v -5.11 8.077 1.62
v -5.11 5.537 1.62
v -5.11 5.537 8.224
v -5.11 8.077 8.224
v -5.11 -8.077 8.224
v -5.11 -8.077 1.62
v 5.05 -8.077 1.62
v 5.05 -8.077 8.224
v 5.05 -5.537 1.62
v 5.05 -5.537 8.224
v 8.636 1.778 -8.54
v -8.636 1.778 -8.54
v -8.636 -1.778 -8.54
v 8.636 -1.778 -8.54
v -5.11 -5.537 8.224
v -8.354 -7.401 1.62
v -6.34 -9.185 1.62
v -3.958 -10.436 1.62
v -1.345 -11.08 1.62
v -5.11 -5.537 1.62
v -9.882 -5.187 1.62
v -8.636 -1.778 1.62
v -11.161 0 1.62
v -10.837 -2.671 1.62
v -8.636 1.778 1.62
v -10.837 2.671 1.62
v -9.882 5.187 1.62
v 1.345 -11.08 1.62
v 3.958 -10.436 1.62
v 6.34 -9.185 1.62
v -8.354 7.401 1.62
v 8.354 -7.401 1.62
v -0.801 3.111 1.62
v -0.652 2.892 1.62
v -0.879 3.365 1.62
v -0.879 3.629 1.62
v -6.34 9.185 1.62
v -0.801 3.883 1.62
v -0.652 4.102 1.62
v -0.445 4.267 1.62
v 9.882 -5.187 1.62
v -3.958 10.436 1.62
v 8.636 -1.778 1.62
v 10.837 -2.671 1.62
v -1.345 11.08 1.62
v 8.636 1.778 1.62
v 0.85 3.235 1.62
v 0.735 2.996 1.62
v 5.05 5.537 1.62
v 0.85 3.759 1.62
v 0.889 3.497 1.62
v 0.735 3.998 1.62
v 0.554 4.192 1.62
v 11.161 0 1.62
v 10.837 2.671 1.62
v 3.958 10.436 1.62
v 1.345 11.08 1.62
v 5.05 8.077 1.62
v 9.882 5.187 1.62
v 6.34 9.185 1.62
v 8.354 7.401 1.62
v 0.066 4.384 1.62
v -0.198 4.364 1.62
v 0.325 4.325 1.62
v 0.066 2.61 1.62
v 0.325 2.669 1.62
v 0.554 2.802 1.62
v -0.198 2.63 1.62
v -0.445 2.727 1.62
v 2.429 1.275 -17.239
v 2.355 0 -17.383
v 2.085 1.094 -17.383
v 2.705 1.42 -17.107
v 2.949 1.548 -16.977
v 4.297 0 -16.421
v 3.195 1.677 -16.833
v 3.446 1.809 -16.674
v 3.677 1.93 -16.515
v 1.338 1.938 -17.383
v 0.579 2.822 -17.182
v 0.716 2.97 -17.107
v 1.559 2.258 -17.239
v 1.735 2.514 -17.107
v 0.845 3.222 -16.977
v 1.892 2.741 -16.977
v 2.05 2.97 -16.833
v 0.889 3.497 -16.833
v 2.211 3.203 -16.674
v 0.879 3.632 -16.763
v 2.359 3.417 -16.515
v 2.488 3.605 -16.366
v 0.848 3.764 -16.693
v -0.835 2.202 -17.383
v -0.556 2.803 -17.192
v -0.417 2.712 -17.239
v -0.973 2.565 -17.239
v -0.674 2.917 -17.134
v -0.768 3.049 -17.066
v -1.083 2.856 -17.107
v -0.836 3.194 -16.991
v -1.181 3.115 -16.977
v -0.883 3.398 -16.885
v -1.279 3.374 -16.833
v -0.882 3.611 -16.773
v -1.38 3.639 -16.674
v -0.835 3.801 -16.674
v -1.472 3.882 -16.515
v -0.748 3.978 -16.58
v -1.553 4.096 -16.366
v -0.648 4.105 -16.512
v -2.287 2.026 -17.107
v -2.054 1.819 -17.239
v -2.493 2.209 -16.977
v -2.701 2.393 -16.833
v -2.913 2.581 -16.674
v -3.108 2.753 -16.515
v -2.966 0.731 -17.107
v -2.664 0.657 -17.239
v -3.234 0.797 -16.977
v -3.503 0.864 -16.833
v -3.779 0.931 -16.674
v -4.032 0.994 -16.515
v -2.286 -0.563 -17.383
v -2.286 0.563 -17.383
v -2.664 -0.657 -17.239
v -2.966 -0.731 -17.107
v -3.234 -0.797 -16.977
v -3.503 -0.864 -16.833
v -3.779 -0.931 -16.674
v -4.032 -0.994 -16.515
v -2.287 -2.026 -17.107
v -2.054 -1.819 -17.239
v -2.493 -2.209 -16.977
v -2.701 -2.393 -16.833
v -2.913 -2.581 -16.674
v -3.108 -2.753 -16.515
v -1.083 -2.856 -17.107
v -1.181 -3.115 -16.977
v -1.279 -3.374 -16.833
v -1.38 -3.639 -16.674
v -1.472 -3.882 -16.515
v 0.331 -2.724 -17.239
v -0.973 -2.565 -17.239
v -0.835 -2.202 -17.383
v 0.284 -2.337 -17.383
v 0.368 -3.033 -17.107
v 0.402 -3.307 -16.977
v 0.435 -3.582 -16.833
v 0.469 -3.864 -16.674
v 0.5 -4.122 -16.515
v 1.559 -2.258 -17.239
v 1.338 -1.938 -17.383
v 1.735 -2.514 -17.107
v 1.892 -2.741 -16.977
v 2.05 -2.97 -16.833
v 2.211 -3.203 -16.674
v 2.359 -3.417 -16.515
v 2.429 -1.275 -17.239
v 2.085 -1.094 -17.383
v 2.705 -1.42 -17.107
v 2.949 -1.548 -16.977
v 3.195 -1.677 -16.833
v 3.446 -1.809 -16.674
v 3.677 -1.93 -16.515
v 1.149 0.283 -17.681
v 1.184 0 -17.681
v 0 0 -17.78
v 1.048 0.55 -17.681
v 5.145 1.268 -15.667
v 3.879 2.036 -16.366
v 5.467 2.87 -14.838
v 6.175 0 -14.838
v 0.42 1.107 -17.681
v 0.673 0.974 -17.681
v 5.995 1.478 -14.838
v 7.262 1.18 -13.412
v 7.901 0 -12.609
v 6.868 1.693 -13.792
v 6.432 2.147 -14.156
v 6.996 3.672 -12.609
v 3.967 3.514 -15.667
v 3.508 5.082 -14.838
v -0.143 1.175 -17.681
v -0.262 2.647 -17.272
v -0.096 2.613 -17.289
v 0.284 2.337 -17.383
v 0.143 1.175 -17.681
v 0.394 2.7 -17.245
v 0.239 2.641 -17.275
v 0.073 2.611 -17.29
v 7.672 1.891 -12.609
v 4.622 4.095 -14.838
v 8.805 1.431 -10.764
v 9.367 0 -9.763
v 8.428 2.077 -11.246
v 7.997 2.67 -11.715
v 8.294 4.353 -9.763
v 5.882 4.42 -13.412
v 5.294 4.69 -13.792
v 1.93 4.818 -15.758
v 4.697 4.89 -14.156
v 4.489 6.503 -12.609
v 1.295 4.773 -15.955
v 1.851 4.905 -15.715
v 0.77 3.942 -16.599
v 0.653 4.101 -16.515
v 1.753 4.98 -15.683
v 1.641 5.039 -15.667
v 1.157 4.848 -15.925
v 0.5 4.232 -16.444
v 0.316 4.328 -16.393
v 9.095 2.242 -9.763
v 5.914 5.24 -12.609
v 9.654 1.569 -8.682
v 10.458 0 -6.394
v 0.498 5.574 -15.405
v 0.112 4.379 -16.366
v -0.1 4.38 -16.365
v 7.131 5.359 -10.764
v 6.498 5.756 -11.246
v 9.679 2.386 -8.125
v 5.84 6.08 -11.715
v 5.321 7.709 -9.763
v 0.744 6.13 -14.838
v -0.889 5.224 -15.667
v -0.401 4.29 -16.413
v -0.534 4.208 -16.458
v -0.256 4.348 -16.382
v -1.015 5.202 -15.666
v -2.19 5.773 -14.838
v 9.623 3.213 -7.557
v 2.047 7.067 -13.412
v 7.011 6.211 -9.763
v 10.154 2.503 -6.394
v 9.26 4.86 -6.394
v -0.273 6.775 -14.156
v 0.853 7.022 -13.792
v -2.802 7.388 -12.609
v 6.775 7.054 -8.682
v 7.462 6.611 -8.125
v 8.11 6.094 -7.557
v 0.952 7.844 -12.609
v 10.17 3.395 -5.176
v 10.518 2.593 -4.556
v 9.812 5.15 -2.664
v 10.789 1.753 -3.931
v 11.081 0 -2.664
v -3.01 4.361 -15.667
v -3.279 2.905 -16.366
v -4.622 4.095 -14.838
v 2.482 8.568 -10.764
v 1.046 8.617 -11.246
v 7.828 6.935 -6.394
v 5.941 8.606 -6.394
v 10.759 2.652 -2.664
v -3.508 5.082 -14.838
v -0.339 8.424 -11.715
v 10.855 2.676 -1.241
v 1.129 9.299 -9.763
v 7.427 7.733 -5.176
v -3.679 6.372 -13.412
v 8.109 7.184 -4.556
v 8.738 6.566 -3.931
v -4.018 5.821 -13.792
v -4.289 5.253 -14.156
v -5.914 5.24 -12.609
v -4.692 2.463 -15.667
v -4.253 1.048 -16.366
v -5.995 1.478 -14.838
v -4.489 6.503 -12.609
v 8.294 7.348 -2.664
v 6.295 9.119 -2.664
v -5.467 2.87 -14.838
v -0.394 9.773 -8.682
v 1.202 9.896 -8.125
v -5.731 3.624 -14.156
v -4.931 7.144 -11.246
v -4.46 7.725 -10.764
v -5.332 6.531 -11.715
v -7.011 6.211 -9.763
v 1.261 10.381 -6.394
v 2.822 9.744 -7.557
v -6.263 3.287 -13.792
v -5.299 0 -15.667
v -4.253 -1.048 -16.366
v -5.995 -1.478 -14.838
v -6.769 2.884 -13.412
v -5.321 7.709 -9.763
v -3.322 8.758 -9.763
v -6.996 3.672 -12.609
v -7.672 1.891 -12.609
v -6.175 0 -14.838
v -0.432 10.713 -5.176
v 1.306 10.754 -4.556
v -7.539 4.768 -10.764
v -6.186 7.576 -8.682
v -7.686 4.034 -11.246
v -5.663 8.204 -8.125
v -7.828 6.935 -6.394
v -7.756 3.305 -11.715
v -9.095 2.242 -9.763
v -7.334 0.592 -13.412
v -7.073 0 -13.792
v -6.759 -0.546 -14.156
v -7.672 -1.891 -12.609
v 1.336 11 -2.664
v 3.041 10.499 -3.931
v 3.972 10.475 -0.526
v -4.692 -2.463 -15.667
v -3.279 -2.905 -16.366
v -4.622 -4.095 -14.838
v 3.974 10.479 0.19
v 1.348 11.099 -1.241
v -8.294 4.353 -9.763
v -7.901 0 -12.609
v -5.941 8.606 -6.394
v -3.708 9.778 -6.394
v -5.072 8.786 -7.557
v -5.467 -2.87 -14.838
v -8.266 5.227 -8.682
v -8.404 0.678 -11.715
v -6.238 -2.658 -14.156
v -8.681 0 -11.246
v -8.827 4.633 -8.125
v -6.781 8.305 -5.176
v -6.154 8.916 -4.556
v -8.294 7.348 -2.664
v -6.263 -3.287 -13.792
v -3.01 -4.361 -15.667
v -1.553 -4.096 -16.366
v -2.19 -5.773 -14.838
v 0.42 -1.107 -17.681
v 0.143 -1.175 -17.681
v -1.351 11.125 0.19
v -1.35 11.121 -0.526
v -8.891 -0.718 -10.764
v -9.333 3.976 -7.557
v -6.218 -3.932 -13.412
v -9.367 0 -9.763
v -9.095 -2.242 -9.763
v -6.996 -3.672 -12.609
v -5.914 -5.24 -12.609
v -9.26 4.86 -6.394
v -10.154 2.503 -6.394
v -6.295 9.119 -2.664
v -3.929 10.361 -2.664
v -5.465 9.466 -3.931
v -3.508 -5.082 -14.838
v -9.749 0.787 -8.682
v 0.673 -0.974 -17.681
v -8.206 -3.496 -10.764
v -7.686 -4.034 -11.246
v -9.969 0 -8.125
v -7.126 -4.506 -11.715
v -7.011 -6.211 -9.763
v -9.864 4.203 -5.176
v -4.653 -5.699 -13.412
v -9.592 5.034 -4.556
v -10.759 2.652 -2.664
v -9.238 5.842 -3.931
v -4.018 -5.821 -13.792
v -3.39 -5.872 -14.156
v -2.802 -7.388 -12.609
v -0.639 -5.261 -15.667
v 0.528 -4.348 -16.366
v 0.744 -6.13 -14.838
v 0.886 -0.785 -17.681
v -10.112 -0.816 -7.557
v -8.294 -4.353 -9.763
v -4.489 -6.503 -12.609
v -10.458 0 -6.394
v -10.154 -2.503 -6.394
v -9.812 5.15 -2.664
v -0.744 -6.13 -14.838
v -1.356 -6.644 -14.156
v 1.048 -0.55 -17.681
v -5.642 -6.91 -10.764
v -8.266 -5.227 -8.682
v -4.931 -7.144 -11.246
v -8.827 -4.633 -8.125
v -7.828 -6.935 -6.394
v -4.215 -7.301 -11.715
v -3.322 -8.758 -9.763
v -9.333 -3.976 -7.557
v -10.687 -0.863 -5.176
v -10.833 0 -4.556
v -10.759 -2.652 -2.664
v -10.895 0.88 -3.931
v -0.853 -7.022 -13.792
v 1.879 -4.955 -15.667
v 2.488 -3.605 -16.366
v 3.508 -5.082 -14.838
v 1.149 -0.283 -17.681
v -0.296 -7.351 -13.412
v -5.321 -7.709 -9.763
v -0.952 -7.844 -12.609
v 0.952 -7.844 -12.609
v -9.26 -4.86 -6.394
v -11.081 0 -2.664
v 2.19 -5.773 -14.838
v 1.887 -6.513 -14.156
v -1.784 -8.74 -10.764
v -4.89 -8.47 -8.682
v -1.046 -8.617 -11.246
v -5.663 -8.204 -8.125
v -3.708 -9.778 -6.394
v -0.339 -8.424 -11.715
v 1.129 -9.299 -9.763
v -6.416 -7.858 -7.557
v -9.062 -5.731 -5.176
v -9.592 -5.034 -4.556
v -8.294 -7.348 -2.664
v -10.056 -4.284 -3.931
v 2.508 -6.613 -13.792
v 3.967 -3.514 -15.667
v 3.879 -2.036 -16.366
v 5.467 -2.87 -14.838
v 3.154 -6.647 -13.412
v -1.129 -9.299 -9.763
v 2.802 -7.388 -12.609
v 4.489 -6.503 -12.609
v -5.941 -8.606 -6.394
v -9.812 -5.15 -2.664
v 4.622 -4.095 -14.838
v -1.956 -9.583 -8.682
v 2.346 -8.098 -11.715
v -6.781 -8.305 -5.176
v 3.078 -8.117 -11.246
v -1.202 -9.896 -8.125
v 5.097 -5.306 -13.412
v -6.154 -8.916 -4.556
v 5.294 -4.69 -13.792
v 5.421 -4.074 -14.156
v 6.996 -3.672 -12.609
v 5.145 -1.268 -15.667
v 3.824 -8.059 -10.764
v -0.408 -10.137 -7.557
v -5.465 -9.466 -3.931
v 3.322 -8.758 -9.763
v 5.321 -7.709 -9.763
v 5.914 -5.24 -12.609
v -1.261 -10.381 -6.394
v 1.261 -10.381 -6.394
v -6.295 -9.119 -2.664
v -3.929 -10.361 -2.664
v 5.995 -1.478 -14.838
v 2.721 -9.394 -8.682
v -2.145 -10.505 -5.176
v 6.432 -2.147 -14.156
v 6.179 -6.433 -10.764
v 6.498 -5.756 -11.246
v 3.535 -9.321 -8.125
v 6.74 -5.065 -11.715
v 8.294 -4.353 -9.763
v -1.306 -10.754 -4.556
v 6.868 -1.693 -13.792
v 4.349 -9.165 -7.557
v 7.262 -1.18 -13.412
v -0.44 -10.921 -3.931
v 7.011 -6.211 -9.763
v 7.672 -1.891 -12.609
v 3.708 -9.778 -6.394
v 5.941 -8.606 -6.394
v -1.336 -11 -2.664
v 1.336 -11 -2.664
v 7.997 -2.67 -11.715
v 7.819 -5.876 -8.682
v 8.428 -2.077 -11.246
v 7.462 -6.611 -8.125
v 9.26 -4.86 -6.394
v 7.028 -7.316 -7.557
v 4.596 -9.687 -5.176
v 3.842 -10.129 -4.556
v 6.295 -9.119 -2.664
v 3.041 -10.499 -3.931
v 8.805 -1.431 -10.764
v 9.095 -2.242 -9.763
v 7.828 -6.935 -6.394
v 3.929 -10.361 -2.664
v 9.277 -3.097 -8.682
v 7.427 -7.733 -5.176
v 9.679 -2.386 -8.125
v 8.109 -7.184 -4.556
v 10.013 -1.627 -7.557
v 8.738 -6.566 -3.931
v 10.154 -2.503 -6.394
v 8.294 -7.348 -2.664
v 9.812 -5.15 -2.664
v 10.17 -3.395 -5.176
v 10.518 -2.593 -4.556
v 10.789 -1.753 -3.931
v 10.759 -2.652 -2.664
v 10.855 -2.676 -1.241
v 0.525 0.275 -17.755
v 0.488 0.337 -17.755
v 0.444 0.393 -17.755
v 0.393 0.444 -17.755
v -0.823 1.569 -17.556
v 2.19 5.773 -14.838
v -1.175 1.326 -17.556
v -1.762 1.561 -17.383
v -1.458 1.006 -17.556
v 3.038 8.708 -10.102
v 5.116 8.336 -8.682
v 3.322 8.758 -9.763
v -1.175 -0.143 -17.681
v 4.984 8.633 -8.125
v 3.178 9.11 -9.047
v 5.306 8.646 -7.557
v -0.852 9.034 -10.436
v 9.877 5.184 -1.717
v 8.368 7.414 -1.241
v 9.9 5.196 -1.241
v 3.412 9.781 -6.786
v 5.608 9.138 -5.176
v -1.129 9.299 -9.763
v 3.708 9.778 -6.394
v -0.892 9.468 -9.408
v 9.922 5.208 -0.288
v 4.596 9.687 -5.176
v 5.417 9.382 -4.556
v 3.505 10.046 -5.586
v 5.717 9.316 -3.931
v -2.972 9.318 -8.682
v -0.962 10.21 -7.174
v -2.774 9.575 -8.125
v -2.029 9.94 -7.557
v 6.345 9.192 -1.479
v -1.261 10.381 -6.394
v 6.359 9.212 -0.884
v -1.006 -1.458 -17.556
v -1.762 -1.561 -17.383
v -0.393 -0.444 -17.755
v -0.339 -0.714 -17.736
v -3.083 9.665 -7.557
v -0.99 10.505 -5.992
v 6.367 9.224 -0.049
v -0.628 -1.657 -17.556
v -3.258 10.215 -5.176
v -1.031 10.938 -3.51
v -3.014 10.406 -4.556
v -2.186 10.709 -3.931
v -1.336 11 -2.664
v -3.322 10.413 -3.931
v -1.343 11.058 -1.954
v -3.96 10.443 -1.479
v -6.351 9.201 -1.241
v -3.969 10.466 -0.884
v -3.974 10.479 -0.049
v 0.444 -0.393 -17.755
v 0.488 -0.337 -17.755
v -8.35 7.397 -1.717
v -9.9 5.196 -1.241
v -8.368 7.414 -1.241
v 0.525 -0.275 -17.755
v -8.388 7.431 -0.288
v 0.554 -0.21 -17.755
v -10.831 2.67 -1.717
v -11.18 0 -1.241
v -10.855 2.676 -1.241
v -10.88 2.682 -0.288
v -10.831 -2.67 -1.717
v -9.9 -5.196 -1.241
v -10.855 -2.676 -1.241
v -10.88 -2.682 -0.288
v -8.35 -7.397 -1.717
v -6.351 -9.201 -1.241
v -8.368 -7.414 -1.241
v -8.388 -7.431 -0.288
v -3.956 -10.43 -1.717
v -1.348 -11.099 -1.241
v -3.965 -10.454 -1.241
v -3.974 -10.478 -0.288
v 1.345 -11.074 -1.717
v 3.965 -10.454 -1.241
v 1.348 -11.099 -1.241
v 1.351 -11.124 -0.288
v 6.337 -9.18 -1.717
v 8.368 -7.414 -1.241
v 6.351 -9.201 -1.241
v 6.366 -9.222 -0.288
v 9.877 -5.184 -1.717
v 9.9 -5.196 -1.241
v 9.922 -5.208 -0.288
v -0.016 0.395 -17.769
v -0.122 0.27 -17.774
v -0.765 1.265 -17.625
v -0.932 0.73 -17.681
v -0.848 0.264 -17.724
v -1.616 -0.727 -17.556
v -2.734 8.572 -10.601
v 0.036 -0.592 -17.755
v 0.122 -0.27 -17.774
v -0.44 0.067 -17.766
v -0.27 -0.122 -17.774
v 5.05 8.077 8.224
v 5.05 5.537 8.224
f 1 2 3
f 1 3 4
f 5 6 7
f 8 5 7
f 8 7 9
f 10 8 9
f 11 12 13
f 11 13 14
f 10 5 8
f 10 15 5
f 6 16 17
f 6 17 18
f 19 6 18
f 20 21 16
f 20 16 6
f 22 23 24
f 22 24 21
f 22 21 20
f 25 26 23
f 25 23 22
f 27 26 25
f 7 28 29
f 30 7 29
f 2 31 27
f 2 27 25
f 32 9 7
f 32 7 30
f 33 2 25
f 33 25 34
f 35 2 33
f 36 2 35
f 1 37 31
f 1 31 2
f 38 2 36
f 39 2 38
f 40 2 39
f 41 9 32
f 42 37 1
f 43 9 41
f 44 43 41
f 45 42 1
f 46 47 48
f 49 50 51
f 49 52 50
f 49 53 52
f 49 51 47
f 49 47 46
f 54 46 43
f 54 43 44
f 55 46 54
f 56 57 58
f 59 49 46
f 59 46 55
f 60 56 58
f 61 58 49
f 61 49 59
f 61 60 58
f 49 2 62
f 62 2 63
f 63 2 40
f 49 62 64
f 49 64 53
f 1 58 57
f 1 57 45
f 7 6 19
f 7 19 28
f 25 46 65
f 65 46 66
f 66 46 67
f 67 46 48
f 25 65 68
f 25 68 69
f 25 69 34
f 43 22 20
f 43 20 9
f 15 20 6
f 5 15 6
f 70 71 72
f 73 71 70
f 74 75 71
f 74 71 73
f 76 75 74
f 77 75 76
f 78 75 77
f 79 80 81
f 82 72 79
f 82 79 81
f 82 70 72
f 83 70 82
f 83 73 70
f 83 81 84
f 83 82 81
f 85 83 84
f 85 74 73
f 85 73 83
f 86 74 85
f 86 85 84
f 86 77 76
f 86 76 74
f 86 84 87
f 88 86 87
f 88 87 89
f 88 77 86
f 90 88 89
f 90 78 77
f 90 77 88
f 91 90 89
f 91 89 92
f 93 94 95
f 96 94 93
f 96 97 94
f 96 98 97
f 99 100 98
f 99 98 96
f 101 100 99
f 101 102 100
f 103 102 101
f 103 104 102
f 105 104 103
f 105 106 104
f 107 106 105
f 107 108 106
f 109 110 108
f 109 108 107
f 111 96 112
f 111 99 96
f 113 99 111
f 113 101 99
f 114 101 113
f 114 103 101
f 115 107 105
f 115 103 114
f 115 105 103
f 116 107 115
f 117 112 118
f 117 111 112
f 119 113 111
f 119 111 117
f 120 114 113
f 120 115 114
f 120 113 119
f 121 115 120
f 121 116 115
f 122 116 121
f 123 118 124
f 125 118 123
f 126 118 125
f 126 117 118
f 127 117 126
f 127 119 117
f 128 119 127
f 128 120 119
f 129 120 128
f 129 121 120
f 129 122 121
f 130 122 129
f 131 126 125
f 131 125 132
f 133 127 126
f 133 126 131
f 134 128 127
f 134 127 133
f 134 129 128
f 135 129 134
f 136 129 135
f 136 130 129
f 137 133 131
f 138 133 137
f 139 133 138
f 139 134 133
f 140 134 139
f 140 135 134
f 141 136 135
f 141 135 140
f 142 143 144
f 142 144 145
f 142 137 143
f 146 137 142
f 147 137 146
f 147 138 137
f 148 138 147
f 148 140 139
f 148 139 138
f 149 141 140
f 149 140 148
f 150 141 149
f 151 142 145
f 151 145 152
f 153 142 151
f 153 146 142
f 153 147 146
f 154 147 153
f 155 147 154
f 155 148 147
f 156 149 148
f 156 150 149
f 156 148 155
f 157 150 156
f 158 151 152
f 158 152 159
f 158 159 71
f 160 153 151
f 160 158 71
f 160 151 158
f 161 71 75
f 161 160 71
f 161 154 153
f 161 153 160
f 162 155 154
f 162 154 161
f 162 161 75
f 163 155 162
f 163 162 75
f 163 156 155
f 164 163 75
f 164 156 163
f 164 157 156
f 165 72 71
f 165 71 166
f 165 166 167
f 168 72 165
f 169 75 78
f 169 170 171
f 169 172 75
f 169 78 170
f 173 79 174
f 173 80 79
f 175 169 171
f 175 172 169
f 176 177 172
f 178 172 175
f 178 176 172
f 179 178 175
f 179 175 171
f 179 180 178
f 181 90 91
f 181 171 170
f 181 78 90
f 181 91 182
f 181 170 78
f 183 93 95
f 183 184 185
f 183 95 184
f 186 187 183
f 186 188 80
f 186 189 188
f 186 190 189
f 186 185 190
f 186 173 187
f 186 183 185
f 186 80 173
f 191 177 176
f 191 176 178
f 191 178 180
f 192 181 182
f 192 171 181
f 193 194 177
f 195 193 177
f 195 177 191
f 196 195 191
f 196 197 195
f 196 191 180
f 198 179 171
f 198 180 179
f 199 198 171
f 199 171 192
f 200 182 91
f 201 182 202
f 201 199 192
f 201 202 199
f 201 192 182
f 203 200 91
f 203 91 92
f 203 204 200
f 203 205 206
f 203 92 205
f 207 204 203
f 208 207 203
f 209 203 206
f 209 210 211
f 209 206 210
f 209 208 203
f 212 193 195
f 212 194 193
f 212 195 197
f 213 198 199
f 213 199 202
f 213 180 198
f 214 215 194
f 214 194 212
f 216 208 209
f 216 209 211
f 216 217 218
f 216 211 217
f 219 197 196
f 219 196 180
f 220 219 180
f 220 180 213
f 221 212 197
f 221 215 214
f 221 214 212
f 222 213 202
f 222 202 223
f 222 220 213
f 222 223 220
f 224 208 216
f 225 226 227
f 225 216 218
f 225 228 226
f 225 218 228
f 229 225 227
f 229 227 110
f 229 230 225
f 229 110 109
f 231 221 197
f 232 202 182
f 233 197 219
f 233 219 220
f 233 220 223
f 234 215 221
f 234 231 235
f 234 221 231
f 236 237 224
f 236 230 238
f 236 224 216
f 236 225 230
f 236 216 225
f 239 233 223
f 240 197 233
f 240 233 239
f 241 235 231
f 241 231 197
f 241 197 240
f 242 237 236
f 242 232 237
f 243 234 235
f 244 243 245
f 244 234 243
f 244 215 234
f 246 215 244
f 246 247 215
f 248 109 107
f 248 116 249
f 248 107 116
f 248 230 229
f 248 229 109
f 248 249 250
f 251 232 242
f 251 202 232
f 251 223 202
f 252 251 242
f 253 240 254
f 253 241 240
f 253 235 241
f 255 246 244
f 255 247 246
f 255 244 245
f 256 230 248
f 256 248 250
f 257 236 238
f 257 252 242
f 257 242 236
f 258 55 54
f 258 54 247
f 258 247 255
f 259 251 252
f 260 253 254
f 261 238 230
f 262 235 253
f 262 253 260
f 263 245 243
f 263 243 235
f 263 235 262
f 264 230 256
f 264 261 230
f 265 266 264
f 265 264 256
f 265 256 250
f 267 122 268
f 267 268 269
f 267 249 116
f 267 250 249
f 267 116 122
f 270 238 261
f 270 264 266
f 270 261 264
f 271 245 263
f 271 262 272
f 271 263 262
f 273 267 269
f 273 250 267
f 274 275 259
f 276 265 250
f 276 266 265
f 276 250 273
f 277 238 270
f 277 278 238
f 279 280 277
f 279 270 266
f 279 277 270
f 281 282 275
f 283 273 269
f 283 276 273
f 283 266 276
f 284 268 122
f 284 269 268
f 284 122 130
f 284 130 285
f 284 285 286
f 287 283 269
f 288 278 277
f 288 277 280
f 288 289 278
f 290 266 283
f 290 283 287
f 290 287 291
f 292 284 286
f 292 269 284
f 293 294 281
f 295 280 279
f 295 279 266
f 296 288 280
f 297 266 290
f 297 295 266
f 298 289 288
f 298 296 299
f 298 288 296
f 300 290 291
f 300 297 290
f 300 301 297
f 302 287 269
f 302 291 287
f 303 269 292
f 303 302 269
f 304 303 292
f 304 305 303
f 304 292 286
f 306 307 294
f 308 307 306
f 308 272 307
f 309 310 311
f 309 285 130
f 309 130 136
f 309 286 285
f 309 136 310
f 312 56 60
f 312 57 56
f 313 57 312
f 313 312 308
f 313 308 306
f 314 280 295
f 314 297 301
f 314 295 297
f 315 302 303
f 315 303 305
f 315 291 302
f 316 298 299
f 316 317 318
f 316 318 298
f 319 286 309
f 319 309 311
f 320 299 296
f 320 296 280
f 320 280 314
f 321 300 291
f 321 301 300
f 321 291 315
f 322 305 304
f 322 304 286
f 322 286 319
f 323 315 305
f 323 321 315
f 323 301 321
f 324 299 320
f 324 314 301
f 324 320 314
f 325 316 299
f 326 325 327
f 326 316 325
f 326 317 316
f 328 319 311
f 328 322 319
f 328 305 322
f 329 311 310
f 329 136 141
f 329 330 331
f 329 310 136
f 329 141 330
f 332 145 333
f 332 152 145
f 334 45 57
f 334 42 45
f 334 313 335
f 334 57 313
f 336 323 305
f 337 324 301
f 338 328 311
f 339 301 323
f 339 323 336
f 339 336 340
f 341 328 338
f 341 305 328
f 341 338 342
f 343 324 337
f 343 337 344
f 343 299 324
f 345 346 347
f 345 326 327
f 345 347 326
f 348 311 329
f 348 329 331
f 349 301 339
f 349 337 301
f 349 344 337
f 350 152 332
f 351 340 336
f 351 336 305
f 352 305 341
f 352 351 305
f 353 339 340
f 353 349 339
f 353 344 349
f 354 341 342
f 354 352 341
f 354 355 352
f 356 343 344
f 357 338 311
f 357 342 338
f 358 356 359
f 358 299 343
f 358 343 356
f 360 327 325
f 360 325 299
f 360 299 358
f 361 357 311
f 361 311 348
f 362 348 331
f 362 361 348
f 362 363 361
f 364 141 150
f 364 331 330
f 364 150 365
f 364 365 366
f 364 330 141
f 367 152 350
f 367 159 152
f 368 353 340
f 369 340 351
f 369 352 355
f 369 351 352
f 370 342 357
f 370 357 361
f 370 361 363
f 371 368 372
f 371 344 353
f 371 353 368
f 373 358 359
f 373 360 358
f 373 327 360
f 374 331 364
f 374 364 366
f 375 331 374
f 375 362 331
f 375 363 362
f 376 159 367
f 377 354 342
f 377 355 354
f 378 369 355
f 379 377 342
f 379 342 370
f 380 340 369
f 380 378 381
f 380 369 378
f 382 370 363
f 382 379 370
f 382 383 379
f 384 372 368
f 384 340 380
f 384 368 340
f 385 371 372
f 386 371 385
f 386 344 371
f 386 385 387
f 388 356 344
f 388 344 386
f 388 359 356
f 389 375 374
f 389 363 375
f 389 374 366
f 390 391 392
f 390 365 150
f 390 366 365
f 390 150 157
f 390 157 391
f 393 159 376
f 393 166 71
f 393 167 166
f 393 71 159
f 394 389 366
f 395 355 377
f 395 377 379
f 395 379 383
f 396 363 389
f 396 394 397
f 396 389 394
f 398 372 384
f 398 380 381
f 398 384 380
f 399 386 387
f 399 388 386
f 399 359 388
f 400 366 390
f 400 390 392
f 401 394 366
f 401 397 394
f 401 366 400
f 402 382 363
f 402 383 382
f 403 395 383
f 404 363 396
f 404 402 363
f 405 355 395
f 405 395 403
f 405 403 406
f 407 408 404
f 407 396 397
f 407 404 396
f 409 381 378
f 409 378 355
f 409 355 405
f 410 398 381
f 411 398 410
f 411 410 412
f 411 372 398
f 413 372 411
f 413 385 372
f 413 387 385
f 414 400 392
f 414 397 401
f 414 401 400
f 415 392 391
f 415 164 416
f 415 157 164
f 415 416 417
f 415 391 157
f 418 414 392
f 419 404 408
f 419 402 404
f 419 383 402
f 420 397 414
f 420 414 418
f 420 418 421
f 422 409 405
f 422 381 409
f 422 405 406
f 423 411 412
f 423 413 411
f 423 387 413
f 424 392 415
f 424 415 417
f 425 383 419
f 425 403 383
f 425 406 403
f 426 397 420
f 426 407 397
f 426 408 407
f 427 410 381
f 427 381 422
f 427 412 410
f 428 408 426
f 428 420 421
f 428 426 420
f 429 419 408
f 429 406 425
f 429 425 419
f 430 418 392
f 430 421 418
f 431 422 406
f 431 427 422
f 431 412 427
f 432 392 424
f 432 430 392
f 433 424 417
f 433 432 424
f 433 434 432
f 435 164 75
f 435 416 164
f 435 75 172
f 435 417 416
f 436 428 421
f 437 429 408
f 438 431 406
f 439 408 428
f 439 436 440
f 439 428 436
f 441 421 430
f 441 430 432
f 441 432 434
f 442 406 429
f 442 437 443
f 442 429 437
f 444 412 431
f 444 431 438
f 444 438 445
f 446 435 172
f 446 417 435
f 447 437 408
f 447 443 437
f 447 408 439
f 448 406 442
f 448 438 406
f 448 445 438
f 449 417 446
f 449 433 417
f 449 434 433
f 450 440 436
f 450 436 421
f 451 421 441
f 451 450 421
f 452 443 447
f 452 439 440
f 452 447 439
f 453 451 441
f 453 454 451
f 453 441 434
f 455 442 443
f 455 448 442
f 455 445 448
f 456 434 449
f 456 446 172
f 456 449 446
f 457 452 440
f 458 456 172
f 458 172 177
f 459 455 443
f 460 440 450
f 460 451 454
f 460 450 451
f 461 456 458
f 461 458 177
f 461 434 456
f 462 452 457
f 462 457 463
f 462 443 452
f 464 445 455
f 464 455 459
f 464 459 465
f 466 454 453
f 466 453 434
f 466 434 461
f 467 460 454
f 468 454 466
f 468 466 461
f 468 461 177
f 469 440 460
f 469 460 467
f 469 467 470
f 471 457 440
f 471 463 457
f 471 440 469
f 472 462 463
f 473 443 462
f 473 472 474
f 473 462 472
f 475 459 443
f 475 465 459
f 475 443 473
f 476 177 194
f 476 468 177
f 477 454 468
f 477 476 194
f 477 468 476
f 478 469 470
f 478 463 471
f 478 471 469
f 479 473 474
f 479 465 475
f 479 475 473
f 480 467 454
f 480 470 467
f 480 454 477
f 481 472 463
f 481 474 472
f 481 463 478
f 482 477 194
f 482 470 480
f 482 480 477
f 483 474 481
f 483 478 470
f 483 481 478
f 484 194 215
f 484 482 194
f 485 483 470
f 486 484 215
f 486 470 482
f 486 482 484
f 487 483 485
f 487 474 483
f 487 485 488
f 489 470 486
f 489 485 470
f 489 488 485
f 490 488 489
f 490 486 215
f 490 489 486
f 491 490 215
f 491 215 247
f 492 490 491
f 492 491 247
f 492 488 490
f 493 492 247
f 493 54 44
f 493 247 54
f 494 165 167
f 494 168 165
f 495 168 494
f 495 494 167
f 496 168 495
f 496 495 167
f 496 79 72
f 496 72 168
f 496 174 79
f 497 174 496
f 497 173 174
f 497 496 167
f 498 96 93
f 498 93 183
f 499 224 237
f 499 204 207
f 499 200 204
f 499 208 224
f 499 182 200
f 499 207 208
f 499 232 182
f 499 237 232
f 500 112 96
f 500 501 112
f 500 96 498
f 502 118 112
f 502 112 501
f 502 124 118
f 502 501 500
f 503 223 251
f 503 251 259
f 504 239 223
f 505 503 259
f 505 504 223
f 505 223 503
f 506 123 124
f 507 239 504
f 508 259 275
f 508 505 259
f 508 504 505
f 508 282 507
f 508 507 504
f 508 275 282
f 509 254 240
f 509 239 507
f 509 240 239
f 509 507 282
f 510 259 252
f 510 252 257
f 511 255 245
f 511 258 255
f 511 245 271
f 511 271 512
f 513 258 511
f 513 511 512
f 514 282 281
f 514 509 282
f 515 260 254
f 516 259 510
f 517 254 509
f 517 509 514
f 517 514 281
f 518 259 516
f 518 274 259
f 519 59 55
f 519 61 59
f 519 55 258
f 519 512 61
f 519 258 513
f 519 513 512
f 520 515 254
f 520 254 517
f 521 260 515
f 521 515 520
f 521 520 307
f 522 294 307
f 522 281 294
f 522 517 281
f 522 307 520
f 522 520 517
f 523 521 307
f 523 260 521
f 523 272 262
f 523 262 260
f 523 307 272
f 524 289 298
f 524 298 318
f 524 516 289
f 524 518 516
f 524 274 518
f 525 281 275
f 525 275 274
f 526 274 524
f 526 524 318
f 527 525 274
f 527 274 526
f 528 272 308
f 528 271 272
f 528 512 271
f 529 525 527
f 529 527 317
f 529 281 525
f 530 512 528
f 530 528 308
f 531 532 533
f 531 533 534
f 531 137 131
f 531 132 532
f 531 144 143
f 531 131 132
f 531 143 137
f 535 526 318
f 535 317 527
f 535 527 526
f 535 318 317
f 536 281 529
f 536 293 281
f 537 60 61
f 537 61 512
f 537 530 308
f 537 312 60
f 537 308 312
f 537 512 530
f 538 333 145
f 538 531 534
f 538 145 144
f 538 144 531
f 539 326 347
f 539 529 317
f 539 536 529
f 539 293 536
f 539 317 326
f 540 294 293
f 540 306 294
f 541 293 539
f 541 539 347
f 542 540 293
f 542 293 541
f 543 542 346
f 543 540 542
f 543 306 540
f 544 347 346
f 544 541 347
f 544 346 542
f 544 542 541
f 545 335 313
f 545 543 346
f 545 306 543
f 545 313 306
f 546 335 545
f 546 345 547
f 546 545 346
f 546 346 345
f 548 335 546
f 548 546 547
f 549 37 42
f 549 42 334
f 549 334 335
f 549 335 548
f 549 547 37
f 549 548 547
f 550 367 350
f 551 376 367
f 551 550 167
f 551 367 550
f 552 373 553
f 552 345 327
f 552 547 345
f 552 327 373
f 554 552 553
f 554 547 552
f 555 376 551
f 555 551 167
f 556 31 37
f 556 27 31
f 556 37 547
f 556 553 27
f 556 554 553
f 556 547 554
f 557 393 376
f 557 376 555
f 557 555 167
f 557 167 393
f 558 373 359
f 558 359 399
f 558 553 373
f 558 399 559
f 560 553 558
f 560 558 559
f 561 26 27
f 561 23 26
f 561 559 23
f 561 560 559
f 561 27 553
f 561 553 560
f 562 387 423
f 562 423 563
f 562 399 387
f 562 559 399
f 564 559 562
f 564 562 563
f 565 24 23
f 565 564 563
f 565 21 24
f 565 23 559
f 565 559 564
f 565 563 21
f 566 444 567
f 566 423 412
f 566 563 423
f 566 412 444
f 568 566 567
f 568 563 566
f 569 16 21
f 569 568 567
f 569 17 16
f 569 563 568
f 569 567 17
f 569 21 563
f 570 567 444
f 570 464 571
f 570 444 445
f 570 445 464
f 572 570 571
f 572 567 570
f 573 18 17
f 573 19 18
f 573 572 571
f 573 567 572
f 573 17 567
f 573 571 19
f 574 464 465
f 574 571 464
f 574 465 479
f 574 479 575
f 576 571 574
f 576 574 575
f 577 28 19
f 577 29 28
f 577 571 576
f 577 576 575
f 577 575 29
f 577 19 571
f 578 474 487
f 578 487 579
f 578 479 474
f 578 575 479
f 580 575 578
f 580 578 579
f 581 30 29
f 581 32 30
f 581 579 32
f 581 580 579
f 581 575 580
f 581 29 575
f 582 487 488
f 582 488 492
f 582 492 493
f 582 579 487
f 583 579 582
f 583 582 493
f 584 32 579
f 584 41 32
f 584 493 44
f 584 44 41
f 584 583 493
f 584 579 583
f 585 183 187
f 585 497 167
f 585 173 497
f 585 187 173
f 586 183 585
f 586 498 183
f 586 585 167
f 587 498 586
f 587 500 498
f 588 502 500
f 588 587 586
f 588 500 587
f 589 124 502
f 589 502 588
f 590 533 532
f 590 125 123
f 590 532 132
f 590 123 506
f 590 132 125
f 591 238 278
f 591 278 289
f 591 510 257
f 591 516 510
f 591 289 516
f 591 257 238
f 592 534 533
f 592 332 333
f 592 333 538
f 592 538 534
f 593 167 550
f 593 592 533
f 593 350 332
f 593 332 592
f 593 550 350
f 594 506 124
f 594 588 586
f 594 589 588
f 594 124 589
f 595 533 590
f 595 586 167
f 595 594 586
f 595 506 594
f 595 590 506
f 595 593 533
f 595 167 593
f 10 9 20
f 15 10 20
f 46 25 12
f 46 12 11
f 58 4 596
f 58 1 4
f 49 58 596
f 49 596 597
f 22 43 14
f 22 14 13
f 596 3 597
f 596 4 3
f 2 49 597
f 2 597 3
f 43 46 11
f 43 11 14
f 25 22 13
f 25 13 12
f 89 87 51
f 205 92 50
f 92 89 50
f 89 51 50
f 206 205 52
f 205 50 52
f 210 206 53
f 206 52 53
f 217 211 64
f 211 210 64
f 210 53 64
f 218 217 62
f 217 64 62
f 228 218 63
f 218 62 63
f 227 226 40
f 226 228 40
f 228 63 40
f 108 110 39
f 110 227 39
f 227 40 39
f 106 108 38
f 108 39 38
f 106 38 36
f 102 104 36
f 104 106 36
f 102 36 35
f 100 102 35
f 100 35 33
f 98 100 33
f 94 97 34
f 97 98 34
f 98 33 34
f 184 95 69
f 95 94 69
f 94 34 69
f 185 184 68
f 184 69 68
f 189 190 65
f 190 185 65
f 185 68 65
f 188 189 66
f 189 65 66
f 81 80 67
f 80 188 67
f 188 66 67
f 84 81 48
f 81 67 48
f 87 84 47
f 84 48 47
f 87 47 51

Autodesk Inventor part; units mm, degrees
ref_plane "YZ Plane" through (0, 0, 0) normal (1, 0, 0) x (0, 1, 0)
ref_plane "XZ Plane" through (0, 0, 0) normal (0, 1, 0) x (-1, 0, 0)
ref_plane "XY Plane" through (0, 0, 0) normal (0, 0, 1) x (1, 0, 0)
sketch "Sketch1" plane through (0, 0, 0) normal (0, 1, 0) x (-1, 0, 0)
  ellipse E0 centre (0, 0) end of major axis (0, 17.78) minor radius 11.2075
  line L0 (11.1609, 1.6196) -> (-11.1609, 1.6196)
  line L1 (0, -17.78) -> (0, 1.6196)
  line L2 (8.595, 11.4106) -> (-8.6719, 11.4106)
  dimension "d0" = 17.78
  dimension "d11" = 9.7909
  dimension "d16" = 19.3997
revolve "Revolution1" add sketch "Sketch1" angle 360 about axis through (0, 0, -17.78) along (0, 0, 1) picked at (-2.3015, -10.0552) contours L0 L1 E0
sketch "Sketch2" plane through (0, 0, 1.6196) normal (0, 0, 1) x (1, 0, 0)
  line L0 (-8.636, 1.778) -> (8.636, 1.778)
  line L1 (8.636, 1.778) -> (8.636, -1.778)
  line L2 (8.636, -1.778) -> (-8.636, -1.778)
  line L3 (-8.636, -1.778) -> (-8.636, 1.778)
  line L4 (-8.636, 1.778) -> (8.636, -1.778) construction
  line L5 (8.636, 1.778) -> (-8.636, -1.778) construction
  point P0 (0, 0)
  dimension "d2" = 17.272
  dimension "d3" = 3.556
extrude "Extrusion1" cut sketch "Sketch2" against normal blind 10.16
sketch "Sketch3" plane through (0, 0, 1.6196) normal (0, 0, 1) x (1, 0, 0)
  line L0 (-5.11, 8.0772) -> (5.05, 8.0772)
  line L1 (5.05, 8.0772) -> (5.05, 5.5372)
  line L2 (5.05, 5.5372) -> (-5.11, 5.5372)
  line L3 (-5.11, 5.5372) -> (-5.11, 8.0772)
  line L4 (-5.11, 8.0772) -> (5.05, 5.5372) construction
  line L5 (5.05, 8.0772) -> (-5.11, 5.5372) construction
  circle A0 centre (0, 0) radius 11.1609 projected
  line L6 (-11.1609, 0) -> (11.1609, 0)
  line L7 (11.2075, 0) -> (0, 0) projected
  line L8 (-5.11, -8.0772) -> (5.05, -8.0772)
  line L9 (5.05, -8.0772) -> (5.05, -5.5372)
  line L10 (5.05, -5.5372) -> (-5.11, -5.5372)
  line L11 (-5.11, -5.5372) -> (-5.11, -8.0772)
  point P0 (-0.03, 6.8072)
  dimension "d6" = 10.16
  dimension "d7" = 2.54
  dimension "d12" = 6.8072
extrude "Extrusion2" add sketch "Sketch3" along normal blind 6.604 contours L0 L1 L2 L3 | L11 L10 L9 L8
sketch "Sketch4" plane through (0, 0, 1.6196) normal (0, 0, 1) x (1, 0, 0)
  circle A0 centre (0, 3.497) radius 0.889
  point P0 (0, 0)
  dimension "d13" = 1.778
extrude "Extrusion3" cut sketch "Sketch4" against normal through all
properties part number "Bead Round Button copy 1"
